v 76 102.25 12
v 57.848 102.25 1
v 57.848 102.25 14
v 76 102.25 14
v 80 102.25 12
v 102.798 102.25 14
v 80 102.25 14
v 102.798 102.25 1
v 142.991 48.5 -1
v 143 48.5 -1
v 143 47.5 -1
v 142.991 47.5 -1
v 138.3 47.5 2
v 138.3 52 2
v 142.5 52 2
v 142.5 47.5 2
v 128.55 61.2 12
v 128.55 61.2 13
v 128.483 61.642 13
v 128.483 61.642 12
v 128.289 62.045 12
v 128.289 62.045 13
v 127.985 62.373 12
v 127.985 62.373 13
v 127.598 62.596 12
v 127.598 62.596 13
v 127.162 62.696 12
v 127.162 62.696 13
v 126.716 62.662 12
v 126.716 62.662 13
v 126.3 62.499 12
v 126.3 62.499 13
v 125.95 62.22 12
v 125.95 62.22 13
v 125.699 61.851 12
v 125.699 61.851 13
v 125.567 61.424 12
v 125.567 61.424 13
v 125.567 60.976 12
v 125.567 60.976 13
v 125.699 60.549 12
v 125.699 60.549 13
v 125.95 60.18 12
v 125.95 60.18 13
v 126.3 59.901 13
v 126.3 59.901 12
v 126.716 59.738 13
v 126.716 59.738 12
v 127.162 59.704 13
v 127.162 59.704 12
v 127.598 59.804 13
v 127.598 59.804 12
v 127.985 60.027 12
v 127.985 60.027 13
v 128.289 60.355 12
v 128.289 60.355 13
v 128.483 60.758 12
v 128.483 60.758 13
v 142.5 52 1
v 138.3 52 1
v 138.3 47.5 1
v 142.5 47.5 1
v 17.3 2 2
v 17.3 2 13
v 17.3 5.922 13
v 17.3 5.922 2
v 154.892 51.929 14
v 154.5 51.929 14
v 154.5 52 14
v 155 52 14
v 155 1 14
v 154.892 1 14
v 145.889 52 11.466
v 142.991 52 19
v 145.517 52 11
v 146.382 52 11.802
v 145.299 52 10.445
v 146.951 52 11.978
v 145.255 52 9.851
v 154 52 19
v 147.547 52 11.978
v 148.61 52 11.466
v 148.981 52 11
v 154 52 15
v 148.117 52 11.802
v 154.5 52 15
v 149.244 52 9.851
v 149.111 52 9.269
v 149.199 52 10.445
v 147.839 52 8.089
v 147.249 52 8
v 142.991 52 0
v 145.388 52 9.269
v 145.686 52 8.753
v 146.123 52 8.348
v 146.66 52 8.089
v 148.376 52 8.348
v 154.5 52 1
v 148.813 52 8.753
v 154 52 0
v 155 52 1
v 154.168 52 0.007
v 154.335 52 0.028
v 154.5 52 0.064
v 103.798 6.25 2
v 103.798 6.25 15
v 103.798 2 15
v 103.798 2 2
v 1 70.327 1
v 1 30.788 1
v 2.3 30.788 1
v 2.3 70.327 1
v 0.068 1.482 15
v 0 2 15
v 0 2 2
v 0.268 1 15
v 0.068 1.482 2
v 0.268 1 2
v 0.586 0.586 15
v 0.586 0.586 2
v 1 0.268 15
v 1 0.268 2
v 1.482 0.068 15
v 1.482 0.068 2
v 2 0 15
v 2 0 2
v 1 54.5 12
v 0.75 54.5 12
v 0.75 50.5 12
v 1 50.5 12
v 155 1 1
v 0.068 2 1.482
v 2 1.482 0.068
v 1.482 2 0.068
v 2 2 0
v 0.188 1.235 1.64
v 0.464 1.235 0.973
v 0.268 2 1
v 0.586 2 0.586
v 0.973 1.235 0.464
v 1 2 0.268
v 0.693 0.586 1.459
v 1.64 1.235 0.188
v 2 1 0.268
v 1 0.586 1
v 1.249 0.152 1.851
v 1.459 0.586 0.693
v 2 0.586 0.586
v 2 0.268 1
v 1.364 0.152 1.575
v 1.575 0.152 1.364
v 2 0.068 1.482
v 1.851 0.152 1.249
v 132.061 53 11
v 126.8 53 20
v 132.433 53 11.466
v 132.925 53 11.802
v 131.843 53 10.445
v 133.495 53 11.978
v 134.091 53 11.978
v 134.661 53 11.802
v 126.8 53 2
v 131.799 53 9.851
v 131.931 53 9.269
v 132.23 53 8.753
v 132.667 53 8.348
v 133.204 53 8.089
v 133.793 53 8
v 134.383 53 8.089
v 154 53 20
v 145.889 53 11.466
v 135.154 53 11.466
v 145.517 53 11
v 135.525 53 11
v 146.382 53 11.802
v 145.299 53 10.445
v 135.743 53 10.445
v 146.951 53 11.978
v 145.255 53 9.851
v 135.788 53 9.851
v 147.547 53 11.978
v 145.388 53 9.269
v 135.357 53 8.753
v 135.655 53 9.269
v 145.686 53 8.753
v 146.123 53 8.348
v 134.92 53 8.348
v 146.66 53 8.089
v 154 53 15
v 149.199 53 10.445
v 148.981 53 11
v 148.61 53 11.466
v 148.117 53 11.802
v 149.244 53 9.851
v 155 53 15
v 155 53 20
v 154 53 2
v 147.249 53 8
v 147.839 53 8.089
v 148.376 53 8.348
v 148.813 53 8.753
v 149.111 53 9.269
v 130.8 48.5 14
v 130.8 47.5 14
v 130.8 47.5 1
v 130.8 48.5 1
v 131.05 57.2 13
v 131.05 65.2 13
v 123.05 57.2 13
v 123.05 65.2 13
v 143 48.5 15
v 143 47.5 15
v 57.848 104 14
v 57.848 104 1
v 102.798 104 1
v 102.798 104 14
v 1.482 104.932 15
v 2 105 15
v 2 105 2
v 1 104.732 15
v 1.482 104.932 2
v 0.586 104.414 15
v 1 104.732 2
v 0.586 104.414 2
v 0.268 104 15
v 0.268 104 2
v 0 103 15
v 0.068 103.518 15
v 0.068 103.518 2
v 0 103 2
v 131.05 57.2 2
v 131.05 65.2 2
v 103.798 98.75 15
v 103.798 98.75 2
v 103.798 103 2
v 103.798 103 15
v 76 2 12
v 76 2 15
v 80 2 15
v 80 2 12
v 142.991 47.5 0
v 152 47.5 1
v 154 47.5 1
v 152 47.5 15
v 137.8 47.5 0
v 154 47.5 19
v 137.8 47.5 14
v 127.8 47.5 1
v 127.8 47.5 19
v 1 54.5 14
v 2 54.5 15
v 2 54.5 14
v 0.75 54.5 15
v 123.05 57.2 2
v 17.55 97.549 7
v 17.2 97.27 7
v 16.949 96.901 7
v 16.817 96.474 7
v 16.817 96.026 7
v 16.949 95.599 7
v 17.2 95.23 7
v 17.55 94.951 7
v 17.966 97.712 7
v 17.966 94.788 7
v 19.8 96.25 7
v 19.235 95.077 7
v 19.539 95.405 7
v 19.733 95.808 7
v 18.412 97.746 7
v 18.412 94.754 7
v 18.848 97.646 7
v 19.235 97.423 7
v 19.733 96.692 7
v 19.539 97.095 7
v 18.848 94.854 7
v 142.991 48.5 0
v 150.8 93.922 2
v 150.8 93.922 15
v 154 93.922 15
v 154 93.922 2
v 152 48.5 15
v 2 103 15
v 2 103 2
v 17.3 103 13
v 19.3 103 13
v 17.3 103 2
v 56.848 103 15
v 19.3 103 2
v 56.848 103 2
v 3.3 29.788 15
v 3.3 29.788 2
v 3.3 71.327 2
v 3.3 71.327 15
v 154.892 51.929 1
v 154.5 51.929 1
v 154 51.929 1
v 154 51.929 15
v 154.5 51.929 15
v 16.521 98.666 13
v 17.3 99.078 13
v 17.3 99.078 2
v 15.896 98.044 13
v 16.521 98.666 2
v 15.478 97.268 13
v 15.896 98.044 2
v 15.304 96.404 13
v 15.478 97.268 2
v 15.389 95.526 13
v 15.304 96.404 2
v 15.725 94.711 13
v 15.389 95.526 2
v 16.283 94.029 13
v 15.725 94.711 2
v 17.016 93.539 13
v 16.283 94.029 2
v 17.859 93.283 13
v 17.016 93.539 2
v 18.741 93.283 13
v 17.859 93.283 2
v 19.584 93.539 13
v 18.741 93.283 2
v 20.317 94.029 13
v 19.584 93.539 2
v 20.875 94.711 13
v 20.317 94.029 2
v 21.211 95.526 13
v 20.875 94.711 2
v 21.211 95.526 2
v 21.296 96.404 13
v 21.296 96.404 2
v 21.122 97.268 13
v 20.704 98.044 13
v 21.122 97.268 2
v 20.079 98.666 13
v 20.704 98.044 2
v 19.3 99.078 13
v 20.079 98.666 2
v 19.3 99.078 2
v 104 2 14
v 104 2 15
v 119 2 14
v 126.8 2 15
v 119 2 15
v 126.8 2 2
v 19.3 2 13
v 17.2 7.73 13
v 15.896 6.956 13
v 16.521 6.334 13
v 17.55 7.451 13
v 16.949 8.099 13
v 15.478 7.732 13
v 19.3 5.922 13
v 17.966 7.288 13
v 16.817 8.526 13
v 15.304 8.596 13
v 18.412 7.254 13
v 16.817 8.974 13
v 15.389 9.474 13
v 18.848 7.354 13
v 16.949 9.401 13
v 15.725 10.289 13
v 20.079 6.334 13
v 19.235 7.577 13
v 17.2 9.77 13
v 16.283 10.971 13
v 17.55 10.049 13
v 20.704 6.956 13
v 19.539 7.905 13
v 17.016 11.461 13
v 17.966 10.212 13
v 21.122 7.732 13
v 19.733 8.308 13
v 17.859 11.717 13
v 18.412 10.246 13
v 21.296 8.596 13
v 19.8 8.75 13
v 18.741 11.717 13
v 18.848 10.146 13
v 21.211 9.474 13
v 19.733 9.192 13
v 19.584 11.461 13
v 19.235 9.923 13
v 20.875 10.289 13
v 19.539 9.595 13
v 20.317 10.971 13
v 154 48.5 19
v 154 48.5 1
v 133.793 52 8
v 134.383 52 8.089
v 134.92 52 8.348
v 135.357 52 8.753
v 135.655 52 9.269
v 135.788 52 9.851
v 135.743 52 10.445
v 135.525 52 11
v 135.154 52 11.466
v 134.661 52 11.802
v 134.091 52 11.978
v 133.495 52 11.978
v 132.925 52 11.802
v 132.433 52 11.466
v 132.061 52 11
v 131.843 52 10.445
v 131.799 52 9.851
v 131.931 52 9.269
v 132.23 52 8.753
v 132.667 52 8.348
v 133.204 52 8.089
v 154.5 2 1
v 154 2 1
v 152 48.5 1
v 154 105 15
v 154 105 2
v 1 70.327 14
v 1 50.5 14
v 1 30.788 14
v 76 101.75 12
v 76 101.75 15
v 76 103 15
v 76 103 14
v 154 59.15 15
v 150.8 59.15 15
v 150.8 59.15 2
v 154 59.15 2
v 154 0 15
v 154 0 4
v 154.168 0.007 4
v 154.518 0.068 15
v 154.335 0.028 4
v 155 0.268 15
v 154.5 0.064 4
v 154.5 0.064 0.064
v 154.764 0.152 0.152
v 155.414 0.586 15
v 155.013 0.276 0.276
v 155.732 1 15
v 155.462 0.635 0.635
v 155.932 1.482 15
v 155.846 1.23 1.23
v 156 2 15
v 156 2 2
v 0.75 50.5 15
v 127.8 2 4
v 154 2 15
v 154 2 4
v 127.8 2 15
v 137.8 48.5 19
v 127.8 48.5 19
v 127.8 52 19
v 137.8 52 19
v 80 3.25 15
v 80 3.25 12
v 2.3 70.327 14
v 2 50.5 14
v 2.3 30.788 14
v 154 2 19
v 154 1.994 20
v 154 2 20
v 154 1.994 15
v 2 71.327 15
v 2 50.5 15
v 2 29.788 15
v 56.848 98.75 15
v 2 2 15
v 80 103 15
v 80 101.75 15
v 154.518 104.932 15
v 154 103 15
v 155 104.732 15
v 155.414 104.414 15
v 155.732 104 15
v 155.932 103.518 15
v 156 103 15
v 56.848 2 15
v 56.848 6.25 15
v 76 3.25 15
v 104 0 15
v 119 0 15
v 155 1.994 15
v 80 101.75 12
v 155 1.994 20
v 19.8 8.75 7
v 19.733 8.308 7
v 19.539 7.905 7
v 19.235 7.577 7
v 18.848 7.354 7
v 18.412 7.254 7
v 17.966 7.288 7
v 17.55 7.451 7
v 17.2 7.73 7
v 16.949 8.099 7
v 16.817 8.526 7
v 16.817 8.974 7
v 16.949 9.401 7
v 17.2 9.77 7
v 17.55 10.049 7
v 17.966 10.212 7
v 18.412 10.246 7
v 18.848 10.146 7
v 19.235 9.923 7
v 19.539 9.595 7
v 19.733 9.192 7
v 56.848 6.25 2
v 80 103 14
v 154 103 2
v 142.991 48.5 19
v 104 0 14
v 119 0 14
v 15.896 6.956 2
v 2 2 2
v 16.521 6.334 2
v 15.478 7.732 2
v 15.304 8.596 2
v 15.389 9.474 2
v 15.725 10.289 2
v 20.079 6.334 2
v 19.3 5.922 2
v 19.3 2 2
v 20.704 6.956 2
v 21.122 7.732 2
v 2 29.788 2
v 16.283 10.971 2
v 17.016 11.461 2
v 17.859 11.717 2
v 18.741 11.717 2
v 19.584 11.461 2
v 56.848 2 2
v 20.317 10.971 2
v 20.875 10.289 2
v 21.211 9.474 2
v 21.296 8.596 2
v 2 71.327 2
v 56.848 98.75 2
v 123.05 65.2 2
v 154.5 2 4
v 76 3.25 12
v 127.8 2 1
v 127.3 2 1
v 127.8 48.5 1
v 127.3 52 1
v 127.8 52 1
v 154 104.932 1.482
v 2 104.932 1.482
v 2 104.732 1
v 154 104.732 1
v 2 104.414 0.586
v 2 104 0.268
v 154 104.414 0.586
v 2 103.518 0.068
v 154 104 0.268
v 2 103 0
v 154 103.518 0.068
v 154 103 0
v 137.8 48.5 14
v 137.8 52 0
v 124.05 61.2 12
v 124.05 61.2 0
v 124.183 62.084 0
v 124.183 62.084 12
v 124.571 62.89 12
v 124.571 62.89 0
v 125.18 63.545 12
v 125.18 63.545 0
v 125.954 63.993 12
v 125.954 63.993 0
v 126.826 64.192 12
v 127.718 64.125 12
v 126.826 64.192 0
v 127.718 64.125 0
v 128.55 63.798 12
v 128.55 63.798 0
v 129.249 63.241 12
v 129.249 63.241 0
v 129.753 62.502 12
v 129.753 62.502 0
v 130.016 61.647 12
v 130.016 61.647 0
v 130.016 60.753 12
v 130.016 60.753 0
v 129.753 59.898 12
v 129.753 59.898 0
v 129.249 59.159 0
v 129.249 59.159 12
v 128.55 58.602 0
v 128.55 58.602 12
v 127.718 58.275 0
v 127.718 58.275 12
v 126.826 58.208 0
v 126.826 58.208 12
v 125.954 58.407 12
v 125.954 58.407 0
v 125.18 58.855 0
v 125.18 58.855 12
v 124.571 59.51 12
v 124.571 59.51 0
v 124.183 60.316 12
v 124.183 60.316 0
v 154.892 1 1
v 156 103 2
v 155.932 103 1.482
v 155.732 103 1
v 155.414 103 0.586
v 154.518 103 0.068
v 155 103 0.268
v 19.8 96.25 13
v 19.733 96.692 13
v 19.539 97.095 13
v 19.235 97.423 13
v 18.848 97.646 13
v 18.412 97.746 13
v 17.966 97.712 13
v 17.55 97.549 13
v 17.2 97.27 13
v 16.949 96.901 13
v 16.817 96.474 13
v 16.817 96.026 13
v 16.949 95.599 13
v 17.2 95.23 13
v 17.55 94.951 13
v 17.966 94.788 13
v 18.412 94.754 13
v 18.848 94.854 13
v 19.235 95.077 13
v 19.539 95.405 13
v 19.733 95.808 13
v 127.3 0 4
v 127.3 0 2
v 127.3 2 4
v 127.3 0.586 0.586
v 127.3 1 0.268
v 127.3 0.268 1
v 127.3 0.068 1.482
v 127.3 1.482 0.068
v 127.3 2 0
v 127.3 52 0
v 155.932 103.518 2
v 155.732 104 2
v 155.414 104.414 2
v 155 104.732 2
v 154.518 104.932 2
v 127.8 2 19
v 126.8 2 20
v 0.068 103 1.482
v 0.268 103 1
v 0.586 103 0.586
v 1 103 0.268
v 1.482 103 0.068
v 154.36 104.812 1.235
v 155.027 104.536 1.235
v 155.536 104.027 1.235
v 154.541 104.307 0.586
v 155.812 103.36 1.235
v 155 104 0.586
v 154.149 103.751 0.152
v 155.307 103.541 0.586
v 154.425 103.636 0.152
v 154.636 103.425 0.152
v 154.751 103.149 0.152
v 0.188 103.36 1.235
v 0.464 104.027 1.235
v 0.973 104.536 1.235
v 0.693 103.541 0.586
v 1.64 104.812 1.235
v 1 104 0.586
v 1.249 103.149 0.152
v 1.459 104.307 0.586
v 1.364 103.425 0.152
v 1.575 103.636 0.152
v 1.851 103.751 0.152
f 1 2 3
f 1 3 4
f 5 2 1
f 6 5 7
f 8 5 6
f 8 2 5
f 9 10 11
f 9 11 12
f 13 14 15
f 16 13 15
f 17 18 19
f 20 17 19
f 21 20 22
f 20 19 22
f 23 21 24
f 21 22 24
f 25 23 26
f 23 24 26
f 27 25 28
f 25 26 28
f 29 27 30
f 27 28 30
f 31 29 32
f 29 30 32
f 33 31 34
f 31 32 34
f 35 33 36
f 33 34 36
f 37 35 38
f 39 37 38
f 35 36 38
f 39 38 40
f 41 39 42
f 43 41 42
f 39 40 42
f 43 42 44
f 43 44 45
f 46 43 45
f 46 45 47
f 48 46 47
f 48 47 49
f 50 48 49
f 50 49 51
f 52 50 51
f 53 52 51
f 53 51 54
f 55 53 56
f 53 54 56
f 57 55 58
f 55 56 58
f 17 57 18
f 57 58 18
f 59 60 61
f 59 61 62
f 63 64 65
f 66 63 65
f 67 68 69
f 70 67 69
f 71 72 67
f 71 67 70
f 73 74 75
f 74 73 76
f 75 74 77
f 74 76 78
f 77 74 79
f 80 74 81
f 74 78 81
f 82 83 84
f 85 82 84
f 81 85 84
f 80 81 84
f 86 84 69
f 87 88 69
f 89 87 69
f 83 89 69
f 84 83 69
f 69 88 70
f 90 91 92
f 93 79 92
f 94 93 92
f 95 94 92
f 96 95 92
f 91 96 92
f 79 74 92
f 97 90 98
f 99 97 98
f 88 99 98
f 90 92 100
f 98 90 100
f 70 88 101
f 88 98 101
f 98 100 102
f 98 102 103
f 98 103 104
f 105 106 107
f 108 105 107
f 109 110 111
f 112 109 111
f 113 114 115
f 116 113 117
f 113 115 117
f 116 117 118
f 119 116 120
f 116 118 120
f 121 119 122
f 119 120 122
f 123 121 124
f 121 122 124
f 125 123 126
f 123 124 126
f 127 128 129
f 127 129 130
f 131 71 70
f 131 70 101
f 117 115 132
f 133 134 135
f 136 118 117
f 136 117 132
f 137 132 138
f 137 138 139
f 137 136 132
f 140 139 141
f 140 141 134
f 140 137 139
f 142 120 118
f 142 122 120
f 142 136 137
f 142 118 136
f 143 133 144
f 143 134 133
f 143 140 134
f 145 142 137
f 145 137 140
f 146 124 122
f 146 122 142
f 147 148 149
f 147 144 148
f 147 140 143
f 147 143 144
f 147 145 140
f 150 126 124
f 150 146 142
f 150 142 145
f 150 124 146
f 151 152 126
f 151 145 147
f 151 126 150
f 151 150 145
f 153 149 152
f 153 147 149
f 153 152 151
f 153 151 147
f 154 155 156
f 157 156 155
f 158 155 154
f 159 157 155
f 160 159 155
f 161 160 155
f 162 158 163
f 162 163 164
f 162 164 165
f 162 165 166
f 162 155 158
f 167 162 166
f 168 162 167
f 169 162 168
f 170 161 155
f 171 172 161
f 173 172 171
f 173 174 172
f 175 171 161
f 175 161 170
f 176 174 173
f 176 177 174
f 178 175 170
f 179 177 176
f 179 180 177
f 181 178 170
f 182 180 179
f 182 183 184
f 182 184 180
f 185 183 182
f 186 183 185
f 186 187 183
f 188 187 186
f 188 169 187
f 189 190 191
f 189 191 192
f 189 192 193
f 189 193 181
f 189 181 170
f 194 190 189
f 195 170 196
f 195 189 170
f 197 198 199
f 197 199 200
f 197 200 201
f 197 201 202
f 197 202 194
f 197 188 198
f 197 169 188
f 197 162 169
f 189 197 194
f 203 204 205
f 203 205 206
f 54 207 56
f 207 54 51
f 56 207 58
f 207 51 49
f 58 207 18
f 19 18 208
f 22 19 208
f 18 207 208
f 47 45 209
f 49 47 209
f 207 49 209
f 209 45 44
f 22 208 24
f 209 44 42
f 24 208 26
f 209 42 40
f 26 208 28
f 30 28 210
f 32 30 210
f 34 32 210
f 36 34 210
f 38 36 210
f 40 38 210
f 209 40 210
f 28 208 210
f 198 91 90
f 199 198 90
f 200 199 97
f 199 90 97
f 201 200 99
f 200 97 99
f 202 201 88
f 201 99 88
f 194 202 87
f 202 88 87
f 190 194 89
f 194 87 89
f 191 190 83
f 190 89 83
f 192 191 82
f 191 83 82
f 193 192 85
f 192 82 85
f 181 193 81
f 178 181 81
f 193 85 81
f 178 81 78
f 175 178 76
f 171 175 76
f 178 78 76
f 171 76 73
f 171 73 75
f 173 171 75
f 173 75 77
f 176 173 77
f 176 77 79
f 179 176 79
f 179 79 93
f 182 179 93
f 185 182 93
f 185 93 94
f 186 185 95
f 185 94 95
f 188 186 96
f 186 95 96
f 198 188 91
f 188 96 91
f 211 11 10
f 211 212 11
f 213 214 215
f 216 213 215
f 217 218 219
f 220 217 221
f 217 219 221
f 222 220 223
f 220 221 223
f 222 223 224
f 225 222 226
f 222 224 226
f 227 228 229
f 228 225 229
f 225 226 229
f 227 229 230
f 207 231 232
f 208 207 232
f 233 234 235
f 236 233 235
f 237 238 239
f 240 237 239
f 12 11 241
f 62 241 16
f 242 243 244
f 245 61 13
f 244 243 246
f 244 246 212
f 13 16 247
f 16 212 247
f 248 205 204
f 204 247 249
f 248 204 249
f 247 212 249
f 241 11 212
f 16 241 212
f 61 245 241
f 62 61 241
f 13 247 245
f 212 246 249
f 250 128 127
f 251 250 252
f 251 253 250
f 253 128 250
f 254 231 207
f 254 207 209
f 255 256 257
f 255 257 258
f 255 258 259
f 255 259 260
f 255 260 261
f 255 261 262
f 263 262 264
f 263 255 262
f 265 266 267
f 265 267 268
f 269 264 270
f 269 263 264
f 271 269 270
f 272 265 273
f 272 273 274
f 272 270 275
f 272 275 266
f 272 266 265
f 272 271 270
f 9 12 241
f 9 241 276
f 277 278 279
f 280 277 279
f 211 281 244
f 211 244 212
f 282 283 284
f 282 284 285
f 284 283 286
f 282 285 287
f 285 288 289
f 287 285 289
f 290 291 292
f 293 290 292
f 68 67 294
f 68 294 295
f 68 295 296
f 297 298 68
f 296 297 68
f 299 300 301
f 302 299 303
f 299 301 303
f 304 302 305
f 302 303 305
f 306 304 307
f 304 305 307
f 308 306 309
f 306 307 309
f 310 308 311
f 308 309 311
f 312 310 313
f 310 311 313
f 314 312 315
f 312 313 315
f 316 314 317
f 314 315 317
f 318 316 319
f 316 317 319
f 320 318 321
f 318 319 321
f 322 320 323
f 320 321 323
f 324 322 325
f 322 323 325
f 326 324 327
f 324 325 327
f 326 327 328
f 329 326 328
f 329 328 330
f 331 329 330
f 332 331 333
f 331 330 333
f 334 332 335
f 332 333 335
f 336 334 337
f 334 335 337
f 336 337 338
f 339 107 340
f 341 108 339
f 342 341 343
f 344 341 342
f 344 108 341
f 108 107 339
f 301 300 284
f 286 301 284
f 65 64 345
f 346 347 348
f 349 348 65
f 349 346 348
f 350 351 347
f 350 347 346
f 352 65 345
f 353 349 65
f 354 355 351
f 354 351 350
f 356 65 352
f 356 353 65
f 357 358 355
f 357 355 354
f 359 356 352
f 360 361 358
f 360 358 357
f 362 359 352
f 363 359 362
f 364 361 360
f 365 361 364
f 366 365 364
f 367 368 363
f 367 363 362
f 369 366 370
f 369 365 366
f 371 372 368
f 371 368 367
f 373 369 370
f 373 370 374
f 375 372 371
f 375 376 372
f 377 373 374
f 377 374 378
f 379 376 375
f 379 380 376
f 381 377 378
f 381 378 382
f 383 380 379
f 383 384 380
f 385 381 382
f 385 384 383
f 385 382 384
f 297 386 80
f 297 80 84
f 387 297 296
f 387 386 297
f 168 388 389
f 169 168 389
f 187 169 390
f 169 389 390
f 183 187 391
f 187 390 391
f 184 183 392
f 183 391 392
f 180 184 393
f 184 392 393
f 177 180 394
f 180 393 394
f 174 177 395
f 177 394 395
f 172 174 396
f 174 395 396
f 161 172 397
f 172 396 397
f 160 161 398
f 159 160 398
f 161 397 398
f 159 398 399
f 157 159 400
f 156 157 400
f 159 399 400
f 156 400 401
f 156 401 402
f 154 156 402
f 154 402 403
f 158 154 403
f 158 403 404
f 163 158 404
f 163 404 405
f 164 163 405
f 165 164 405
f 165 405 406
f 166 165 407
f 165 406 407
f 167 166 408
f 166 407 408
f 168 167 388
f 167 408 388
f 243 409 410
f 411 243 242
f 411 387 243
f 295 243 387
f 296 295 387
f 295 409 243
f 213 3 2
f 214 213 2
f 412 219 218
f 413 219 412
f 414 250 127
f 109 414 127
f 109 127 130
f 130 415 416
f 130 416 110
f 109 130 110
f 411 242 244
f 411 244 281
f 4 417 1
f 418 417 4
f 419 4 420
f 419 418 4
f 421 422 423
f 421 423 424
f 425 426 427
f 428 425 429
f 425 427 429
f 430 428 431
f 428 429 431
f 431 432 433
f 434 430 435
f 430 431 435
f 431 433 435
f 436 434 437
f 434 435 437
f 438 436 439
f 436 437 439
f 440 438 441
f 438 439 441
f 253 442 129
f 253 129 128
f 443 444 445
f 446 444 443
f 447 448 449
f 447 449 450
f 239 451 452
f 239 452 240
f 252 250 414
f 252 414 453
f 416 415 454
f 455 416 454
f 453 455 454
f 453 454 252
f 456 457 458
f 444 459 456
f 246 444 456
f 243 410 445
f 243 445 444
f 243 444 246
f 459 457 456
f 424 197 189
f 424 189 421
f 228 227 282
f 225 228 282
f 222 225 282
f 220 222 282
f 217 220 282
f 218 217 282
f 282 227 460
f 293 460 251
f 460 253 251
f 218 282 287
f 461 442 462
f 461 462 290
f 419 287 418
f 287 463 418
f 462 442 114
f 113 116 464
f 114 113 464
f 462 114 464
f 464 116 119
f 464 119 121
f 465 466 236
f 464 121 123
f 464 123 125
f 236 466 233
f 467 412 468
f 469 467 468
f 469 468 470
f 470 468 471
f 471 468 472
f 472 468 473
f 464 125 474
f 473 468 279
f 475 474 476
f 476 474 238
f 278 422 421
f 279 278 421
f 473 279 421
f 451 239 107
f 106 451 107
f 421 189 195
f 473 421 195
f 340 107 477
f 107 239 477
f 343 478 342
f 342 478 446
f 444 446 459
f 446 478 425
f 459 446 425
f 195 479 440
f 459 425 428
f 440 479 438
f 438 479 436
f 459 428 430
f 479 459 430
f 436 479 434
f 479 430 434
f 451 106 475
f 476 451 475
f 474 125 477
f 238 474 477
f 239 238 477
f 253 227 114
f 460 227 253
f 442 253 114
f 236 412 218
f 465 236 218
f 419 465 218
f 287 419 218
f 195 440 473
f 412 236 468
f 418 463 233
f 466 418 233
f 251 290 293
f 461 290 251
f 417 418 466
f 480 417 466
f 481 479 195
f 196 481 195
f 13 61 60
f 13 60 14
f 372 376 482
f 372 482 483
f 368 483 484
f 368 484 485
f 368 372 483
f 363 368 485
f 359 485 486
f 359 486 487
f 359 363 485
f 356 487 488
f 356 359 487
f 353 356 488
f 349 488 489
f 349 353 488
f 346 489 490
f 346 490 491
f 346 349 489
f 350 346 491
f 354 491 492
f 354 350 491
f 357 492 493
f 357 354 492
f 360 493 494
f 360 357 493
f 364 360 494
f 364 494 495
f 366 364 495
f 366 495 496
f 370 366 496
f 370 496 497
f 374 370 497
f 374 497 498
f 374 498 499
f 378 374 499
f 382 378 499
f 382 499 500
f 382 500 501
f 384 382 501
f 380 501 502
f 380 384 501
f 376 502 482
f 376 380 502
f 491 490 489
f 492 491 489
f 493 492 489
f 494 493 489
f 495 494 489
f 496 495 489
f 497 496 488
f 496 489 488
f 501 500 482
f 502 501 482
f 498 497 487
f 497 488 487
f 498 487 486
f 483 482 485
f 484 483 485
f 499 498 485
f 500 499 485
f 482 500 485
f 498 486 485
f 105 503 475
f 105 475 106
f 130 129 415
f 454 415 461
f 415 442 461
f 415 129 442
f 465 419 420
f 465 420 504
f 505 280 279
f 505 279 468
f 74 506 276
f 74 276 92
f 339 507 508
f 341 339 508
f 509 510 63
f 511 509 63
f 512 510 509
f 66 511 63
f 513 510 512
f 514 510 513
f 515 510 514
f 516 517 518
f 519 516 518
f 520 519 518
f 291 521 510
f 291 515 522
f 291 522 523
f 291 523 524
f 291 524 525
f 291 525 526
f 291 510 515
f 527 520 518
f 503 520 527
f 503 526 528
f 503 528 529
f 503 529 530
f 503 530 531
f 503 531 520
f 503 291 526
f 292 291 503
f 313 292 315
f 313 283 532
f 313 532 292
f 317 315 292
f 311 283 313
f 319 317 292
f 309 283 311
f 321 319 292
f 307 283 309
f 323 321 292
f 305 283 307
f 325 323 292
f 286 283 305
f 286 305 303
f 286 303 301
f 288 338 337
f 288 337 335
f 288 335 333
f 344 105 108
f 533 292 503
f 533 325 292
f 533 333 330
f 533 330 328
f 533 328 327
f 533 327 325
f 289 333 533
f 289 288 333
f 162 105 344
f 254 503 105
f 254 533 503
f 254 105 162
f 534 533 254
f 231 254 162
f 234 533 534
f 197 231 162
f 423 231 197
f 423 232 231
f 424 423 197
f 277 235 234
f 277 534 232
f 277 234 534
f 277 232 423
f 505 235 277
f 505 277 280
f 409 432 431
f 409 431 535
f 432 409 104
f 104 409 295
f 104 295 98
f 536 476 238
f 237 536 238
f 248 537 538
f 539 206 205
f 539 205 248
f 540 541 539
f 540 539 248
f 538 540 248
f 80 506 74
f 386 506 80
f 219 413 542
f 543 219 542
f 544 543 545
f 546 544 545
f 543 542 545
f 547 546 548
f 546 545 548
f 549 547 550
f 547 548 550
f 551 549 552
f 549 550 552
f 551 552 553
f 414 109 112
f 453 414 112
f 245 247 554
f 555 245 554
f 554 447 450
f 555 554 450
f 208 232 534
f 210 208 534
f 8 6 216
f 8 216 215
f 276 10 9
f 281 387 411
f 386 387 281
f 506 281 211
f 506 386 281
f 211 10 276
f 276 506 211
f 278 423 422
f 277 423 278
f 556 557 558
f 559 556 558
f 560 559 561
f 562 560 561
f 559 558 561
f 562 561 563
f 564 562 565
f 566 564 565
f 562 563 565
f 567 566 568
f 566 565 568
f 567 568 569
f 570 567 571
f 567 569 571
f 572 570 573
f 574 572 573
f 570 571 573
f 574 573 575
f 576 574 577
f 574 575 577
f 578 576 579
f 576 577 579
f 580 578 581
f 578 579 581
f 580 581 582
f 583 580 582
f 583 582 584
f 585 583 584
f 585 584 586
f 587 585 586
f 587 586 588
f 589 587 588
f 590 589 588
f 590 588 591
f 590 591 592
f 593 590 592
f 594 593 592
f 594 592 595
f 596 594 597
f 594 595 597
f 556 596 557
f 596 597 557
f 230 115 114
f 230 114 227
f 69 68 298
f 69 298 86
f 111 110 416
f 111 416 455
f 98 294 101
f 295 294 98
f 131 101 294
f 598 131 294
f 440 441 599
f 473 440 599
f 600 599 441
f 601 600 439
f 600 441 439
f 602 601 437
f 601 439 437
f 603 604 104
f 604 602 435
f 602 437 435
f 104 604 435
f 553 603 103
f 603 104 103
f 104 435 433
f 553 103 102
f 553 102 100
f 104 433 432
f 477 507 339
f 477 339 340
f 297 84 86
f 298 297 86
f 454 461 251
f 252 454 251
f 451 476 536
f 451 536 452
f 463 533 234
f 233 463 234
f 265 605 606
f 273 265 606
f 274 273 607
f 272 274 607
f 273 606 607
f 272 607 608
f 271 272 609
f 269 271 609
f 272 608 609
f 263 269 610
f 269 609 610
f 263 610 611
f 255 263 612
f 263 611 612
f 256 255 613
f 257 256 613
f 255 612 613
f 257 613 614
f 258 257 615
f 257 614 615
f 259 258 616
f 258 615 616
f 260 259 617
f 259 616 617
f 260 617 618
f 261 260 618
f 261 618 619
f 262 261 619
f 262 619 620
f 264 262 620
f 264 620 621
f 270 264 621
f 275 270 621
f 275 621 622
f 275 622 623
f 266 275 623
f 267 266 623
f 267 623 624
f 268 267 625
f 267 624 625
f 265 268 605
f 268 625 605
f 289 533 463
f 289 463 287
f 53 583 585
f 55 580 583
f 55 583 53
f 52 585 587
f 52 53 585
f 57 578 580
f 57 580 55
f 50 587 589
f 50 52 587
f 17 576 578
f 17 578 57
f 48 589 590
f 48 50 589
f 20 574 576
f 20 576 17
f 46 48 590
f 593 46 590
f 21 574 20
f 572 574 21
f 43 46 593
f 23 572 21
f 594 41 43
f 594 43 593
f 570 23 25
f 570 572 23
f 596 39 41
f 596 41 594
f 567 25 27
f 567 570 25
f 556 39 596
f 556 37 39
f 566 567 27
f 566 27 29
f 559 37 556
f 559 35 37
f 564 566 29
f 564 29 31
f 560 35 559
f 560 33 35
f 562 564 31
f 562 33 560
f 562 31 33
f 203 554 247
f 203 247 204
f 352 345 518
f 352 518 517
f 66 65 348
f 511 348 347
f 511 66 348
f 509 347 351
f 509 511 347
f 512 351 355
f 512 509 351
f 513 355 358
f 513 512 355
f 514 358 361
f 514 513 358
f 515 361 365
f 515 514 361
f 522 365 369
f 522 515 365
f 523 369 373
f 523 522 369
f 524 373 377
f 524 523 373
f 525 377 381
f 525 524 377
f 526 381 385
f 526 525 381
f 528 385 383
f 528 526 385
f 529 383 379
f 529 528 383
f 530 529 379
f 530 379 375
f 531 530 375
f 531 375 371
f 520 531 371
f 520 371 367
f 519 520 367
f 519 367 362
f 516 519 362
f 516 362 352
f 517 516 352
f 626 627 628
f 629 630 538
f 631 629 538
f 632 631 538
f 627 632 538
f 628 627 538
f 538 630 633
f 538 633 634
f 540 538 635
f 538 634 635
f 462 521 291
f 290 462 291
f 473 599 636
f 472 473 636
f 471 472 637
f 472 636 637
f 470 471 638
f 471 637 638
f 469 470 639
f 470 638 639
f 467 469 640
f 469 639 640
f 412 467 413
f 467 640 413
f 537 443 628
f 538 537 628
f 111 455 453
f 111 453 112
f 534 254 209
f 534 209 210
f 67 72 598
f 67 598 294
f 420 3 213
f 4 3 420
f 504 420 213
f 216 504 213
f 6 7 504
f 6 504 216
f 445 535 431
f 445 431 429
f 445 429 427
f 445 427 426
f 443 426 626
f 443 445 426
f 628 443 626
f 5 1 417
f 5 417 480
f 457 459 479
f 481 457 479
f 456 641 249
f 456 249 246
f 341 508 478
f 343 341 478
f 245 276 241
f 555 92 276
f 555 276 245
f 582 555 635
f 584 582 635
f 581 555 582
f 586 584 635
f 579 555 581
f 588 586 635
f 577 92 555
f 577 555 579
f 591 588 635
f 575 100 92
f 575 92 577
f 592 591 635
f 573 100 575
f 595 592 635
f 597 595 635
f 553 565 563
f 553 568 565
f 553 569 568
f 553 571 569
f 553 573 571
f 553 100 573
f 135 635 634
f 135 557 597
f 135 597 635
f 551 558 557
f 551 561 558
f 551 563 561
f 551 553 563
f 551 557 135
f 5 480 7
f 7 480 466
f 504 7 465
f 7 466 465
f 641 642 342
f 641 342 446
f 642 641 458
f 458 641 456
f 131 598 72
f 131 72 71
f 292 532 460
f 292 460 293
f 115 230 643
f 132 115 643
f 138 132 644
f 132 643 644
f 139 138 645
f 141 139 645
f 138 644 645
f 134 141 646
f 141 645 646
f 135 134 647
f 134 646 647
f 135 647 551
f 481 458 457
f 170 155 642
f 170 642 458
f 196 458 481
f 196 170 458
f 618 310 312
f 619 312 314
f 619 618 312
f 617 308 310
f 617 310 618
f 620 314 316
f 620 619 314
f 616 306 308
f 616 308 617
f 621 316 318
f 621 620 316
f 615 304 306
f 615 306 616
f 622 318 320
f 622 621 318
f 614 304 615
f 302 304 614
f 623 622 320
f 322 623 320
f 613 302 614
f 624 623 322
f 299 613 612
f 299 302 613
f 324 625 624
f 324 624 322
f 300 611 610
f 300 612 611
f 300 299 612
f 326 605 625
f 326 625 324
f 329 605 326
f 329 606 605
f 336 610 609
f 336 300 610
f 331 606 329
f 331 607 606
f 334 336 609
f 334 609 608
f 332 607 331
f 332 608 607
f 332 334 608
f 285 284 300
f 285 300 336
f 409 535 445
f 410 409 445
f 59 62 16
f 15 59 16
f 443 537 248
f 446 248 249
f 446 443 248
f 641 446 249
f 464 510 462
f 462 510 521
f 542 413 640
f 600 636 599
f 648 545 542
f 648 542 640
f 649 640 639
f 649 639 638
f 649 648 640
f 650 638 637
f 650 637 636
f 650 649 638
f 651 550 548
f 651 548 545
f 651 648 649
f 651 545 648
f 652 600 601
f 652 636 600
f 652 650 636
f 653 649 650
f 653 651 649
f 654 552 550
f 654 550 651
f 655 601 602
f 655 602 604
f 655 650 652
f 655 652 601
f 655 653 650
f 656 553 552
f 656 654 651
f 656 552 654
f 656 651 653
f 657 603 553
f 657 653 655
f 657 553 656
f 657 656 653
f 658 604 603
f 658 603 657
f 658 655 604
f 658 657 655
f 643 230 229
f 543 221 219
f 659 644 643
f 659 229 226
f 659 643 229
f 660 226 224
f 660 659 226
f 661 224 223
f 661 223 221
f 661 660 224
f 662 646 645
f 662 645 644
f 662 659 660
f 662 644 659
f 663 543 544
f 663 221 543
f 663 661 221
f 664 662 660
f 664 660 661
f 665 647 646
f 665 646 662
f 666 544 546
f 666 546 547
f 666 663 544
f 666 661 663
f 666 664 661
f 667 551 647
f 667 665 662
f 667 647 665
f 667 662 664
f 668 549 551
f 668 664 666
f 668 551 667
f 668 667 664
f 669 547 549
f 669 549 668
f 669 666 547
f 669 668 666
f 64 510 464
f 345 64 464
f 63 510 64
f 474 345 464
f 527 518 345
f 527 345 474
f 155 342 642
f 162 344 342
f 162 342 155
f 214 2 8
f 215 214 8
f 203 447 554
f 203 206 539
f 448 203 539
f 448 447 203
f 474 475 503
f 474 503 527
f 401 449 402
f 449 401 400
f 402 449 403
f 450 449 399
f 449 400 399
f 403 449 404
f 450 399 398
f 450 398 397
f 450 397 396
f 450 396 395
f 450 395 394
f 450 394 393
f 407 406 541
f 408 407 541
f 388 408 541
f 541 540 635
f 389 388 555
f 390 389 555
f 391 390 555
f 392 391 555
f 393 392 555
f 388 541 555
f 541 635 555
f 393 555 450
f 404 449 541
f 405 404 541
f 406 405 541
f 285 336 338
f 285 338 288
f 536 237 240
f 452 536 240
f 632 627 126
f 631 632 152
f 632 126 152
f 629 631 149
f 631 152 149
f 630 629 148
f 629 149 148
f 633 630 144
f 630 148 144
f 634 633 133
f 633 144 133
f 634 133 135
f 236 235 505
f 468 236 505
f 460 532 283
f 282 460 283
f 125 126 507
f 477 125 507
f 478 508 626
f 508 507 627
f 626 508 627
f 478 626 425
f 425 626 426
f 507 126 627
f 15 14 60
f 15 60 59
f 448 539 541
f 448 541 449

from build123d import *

# Parameters (mm, degrees)
SKETCH2_W                = 156
SKETCH2_H                = 105
BOSS_EXTRUDE1_DEPTH      = 15
SHELL1_T                 = -2
SKETCH16_W               = 1.3
SKETCH16_H               = 41.538446475
BOSS_EXTRUDE7_DEPTH      = 13
SKETCH17_W               = 46.949973518
SKETCH17_H               = 1.75
BOSS_EXTRUDE8_DEPTH      = 13
SKETCH18_W               = 27.2
SKETCH18_H               = 51
BOSS_EXTRUDE9_DEPTH      = 18
SHELL2_START             = 2
SHELL2_DEPTH             = 50
SHELL2_START_2           = 102.25
SHELL2_2_OUTLINE_W       = 44.949973518
SHELL2_2_OUTLINE_H       = 13
SHELL2_2_DEPTH           = 1.75
SHELL2_START_3           = 30.788376177
SHELL2_3_OUTLINE_W       = 1.3
SHELL2_3_OUTLINE_H       = 13
SHELL2_3_DEPTH           = 39.538446475
SHELL2_START_4           = 1
SHELL2_4_OUTLINE_W       = 27.2
SHELL2_4_OUTLINE_H       = 13
SHELL2_4_DEPTH           = 1
SKETCH19_W               = 26.2
SKETCH19_H               = 52
CUT_EXTRUDE9_DEPTH       = 2
BOSS_EXTRUDE10_REACH     = 190.566
SKETCH24_W               = 0.891520296
SKETCH24_H               = 50.929477882
SKETCH25_W               = 26.2
SKETCH25_H               = 1
BOSS_EXTRUDE11_DEPTH     = 12
SKETCH27_W               = 26.2
SKETCH27_H               = 1
BOSS_EXTRUDE12_DEPTH     = 18
SKETCH28_W               = 9
SKETCH28_H               = 1
CUT_EXTRUDE10_DEPTH      = 14
SKETCH29_W               = 7
SKETCH29_H               = 1
CUT_EXTRUDE11_DEPTH      = 13
SKETCH30_W               = 0.5
SKETCH30_H               = 52
CUT_EXTRUDE12_DEPTH      = 1
SKETCH31_W               = 0.5
SKETCH31_H               = 52
CUT_EXTRUDE13_DEPTH      = 1
SKETCH32_W               = 5.2
SKETCH32_H               = 1
BOSS_EXTRUDE13_DEPTH     = 1
SKETCH34_W               = 5.2
SKETCH34_H               = 1
BOSS_EXTRUDE14_DEPTH     = 1
SKETCH35_W               = 5.190628433
SKETCH35_H               = 3.5
BOSS_EXTRUDE15_DEPTH     = 20
SKETCH38_W               = 0.5
SKETCH38_H               = 0.070522118
CUT_EXTRUDE14_DEPTH      = 1
SKETCH41_R               = 2
CUT_EXTRUDE15_DEPTH      = 1
SKETCH42_R               = 2
CUT_EXTRUDE16_DEPTH      = 1
SKETCH43_W               = 5.190628433
SKETCH43_H               = 4.5
CUT_EXTRUDE17_DEPTH      = 1
SKETCH44_W               = 1
SKETCH44_H               = 51.006111213
BOSS_EXTRUDE16_DEPTH     = 5
SKETCH46_W               = 4.2
SKETCH46_H               = 1
CUT_EXTRUDE18_DEPTH      = 4.5
CUT_EXTRUDE19_DEPTH      = 2
CUT_EXTRUDE19_DEPTH_BACK = 2
SKETCH47_W               = 27.2
SKETCH47_H               = 2
SKETCH50_W               = 3.2
SKETCH50_H               = 34.771823391
BOSS_EXTRUDE17_DEPTH     = 13
SKETCH51_R               = 3
BOSS_EXTRUDE18_DEPTH     = 13
SKETCH54_R               = 1.5
CUT_EXTRUDE20_DEPTH      = 6
SKETCH56_W               = 4
SKETCH56_H               = 1.25
CUT_EXTRUDE21_DEPTH      = 3
SKETCH57_W               = 1.25
SKETCH57_H               = 4
CUT_EXTRUDE22_DEPTH      = 3
SKETCH60_W               = 15
SKETCH60_H               = 1
CUT_EXTRUDE24_DEPTH      = 2
SKETCH62_W               = 8
SKETCH62_H               = 8
BOSS_EXTRUDE19_DEPTH     = 13
SKETCH64_R               = 3
CUT_EXTRUDE25_DEPTH      = 12
SKETCH63_R               = 1.5
CUT_EXTRUDE26_DEPTH      = 1
FILLET1_R                = 2
SKETCH66_W               = 46.949973518
SKETCH66_H               = 2.5
BOSS_EXTRUDE20_DEPTH     = 13
RIB1_REACH               = 190.566
SKETCH69_WALLS_W         = 2
SKETCH69_WALLS_H         = 382.881276878
RIB2_REACH               = 190.566
SKETCH70_WALLS_W         = 2
SKETCH70_WALLS_H         = 382.881276878


# Read off the part's stored shape, not the designer's step: Shell2
with BuildPart() as part:
    # Sketch2 → Boss-Extrude1 (new body)
    with BuildSketch(Plane.XY):
        with Locations((78, 52.5)):
            Rectangle(SKETCH2_W, SKETCH2_H)
    extrude(amount=BOSS_EXTRUDE1_DEPTH)

    # Shell1
    shell1_openings = [part.faces().sort_by_distance(p)[0] for p in [
        (78, 52.5, 15),
    ]]
    offset(amount=SHELL1_T, openings=shell1_openings, kind=Kind.INTERSECTION)

    # Sketch16 → Boss-Extrude7 (add)
    with BuildSketch(Plane.XY.offset(2)):
        with Locations((2.65, 50.557599415)):
            Rectangle(SKETCH16_W, SKETCH16_H)
    extrude(amount=BOSS_EXTRUDE7_DEPTH)

    # Sketch17 → Boss-Extrude8 (add)
    with BuildSketch(Plane.XY.offset(2)):
        with Locations((80.323462853, 102.125)):
            Rectangle(SKETCH17_W, SKETCH17_H)
    boss_extrude8 = extrude(amount=BOSS_EXTRUDE8_DEPTH)

    # Sketch18 → Boss-Extrude9 (add)
    with BuildSketch(Plane.XY.offset(2)):
        with Locations((140.4, 27.5)):
            Rectangle(SKETCH18_W, SKETCH18_H)
    extrude(amount=BOSS_EXTRUDE9_DEPTH)

    # Shell2 outline → Shell2 (cut)
    with BuildSketch(Plane(origin=(0, 0, 0), x_dir=(1, 0, 0), z_dir=(0, 1, 0)).offset(SHELL2_START)):
        Polygon((127.8, -1), (127.8, -19), (154, -19), (154, -14), (155, -14), (155, -1), align=None)
    extrude(amount=SHELL2_DEPTH, mode=Mode.SUBTRACT)

    # Shell2 2 outline → Shell2 2 (cut)
    with BuildSketch(Plane(origin=(0, 0, 0), x_dir=(1, 0, 0), z_dir=(0, 1, 0)).offset(SHELL2_START_2)):
        with Locations((80.323462853, -7.5)):
            Rectangle(SHELL2_2_OUTLINE_W, SHELL2_2_OUTLINE_H)
    extrude(amount=SHELL2_2_DEPTH, mode=Mode.SUBTRACT)

    # Shell2 3 outline → Shell2 3 (cut)
    with BuildSketch(Plane(origin=(0, 0, 0), x_dir=(1, 0, 0), z_dir=(0, 1, 0)).offset(SHELL2_START_3)):
        with Locations((1.65, -7.5)):
            Rectangle(SHELL2_3_OUTLINE_W, SHELL2_3_OUTLINE_H)
    extrude(amount=SHELL2_3_DEPTH, mode=Mode.SUBTRACT)

    # Shell2 4 outline → Shell2 4 (cut)
    with BuildSketch(Plane(origin=(0, 0, 0), x_dir=(1, 0, 0), z_dir=(0, 1, 0)).offset(SHELL2_START_4)):
        with Locations((141.4, -7.5)):
            Rectangle(SHELL2_4_OUTLINE_W, SHELL2_4_OUTLINE_H)
    extrude(amount=SHELL2_4_DEPTH, mode=Mode.SUBTRACT)

    # Sketch19 → Cut-Extrude9 (cut)
    with BuildSketch(Plane(origin=(0, 0, 0), x_dir=(-1, 0, 0), z_dir=(0, 0, -1))):
        with Locations((-140.9, 26)):
            Rectangle(SKETCH19_W, SKETCH19_H)
    extrude(amount=-CUT_EXTRUDE9_DEPTH, mode=Mode.SUBTRACT)

    # Sketch24 → Boss-Extrude10 (add, up to next)
    with BuildSketch(Plane(origin=(0, 0, 14), x_dir=(-1, 0, 0), z_dir=(0, 0, -1)), mode=Mode.PRIVATE) as boss_extrude10_sk1:
        with Locations((-154.445760148, 26.464738941)):
            Rectangle(SKETCH24_W, SKETCH24_H)
    boss_extrude10_tool1 = extrude(boss_extrude10_sk1.sketch, amount=BOSS_EXTRUDE10_REACH, mode=Mode.PRIVATE) - part.part
    add(boss_extrude10_tool1.solids().sort_by_distance((154.44576, 26.464739, 14))[0])

    # Sketch25 → Boss-Extrude11 (add)
    with BuildSketch(Plane(origin=(0, 0, 14), x_dir=(-1, 0, 0), z_dir=(0, 0, -1))):
        with Locations((-140.9, 1.5)):
            Rectangle(SKETCH25_W, SKETCH25_H)
    extrude(amount=BOSS_EXTRUDE11_DEPTH)

    # Sketch27 → Boss-Extrude12 (add)
    with BuildSketch(Plane(origin=(0, 0, 19), x_dir=(-1, 0, 0), z_dir=(0, 0, -1))):
        with Locations((-140.9, 48)):
            Rectangle(SKETCH27_W, SKETCH27_H)
    extrude(amount=BOSS_EXTRUDE12_DEPTH)

    # Sketch28 → Cut-Extrude10 (cut)
    with BuildSketch(Plane(origin=(0, 0, 1), x_dir=(-1, 0, 0), z_dir=(0, 0, -1))):
        with Locations((-147.5, 48)):
            Rectangle(SKETCH28_W, SKETCH28_H)
    extrude(amount=-CUT_EXTRUDE10_DEPTH, mode=Mode.SUBTRACT)

    # Sketch29 → Cut-Extrude11 (cut)
    with BuildSketch(Plane(origin=(0, 0, 1), x_dir=(-1, 0, 0), z_dir=(0, 0, -1))):
        with Locations((-134.3, 48)):
            Rectangle(SKETCH29_W, SKETCH29_H)
    extrude(amount=-CUT_EXTRUDE11_DEPTH, mode=Mode.SUBTRACT)

    # Sketch30 → Cut-Extrude12 (cut)
    with BuildSketch(Plane(origin=(0, 0, 0), x_dir=(-1, 0, 0), z_dir=(0, 0, -1))):
        with Locations((-127.55, 26)):
            Rectangle(SKETCH30_W, SKETCH30_H)
    extrude(amount=-CUT_EXTRUDE12_DEPTH, mode=Mode.SUBTRACT)

    # Sketch31 → Cut-Extrude13 (cut)
    with BuildSketch(Plane(origin=(0, 0, 0), x_dir=(-1, 0, 0), z_dir=(0, 0, -1))):
        with Locations((-154.25, 26)):
            Rectangle(SKETCH31_W, SKETCH31_H)
    extrude(amount=-CUT_EXTRUDE13_DEPTH, mode=Mode.SUBTRACT)

    # Sketch32 → Boss-Extrude13 (add)
    with BuildSketch(Plane(origin=(0, 0, 1), x_dir=(-1, 0, 0), z_dir=(0, 0, -1))):
        with Locations((-140.4, 48)):
            Rectangle(SKETCH32_W, SKETCH32_H)
    extrude(amount=BOSS_EXTRUDE13_DEPTH)

    # Sketch34 → Boss-Extrude14 (add)
    with BuildSketch(Plane(origin=(0, 0, 0), x_dir=(-1, 0, 0), z_dir=(0, 0, -1))):
        with Locations((-140.4, 48)):
            Rectangle(SKETCH34_W, SKETCH34_H)
    extrude(amount=BOSS_EXTRUDE14_DEPTH)

    # Sketch35 → Boss-Extrude15 (add)
    with BuildSketch(Plane(origin=(0, 0, 19), x_dir=(-1, 0, 0), z_dir=(0, 0, -1))):
        with Locations((-140.395314217, 50.25)):
            Rectangle(SKETCH35_W, SKETCH35_H)
    extrude(amount=BOSS_EXTRUDE15_DEPTH)

    # Sketch38 → Cut-Extrude14 (cut)
    with BuildSketch(Plane(origin=(0, 0, 14), x_dir=(-1, 0, 0), z_dir=(0, 0, -1))):
        with Locations((-154.25, 51.964738941)):
            Rectangle(SKETCH38_W, SKETCH38_H)
    extrude(amount=-CUT_EXTRUDE14_DEPTH, mode=Mode.SUBTRACT)

    # Sketch41 → Cut-Extrude15 (cut)
    with BuildSketch(Plane.XZ.offset(-52)):
        with Locations(Location((147.249273033, 10, 0), (0, 0, 270))):
            Circle(SKETCH41_R)
    extrude(amount=-CUT_EXTRUDE15_DEPTH, mode=Mode.SUBTRACT)

    # Sketch42 → Cut-Extrude16 (cut)
    with BuildSketch(Plane.XZ.offset(-52)):
        with Locations(Location((133.793210636, 10, 0), (0, 0, 270))):
            Circle(SKETCH42_R)
    extrude(amount=-CUT_EXTRUDE16_DEPTH, mode=Mode.SUBTRACT)

    # Sketch43 → Cut-Extrude17 (cut)
    with BuildSketch(Plane(origin=(0, 0, -1), x_dir=(-1, 0, 0), z_dir=(0, 0, -1))):
        with Locations((-140.395314217, 49.75)):
            Rectangle(SKETCH43_W, SKETCH43_H)
    extrude(amount=-CUT_EXTRUDE17_DEPTH, mode=Mode.SUBTRACT)

    # Sketch44 → Boss-Extrude16 (add)
    with BuildSketch(Plane.XY.offset(15)):
        with Locations((154.5, 27.496944394)):
            Rectangle(SKETCH44_W, SKETCH44_H)
    extrude(amount=BOSS_EXTRUDE16_DEPTH)

    # Sketch46 → Cut-Extrude18 (cut)
    with BuildSketch(Plane.XZ.offset(-47.5)):
        with Locations((140.4, 1.5)):
            Rectangle(SKETCH46_W, SKETCH46_H)
    extrude(amount=-CUT_EXTRUDE18_DEPTH, mode=Mode.SUBTRACT)

    # Sketch47 → Cut-Extrude19 (cut, two sides: drawn at the far end of the back side and taken through both)
    with BuildSketch(Plane(origin=(0, 0, 2), x_dir=(-1, 0, 0), z_dir=(0, 0, -1)).offset(-CUT_EXTRUDE19_DEPTH_BACK)):
        with Locations((-140.9, 1)):
            Rectangle(SKETCH47_W, SKETCH47_H)
    extrude(amount=CUT_EXTRUDE19_DEPTH + CUT_EXTRUDE19_DEPTH_BACK, mode=Mode.SUBTRACT)

    # Mirror3: Boss-Extrude8 across plane
    add(boss_extrude8.mirror(Plane(origin=(0, 52.5, 0), x_dir=(0, 0, 1), z_dir=(0, -1, 0))))

    # Sketch50 → Boss-Extrude17 (add)
    with BuildSketch(Plane.XY.offset(2)):
        with Locations((152.4, 76.53582262)):
            Rectangle(SKETCH50_W, SKETCH50_H)
    extrude(amount=BOSS_EXTRUDE17_DEPTH)

    # Sketch51 → Boss-Extrude18 (add)
    with BuildSketch(Plane.XY):
        with Locations(Location((18.3, 96.25, 0), (0, 0, 180))):
            Circle(SKETCH51_R)
    boss_extrude18 = extrude(amount=BOSS_EXTRUDE18_DEPTH)

    # Sketch54 → Cut-Extrude20 (cut)
    with BuildSketch(Plane.XY.offset(13)):
        with Locations((18.3, 96.25)):
            Circle(SKETCH54_R)
    cut_extrude20 = extrude(amount=-CUT_EXTRUDE20_DEPTH, mode=Mode.SUBTRACT)

    # Mirror4: Boss-Extrude18, Cut-Extrude20 across plane
    add(boss_extrude18.mirror(Plane(origin=(0, 52.5, 0), x_dir=(0, 0, 1), z_dir=(0, -1, 0))))
    add(cut_extrude20.mirror(Plane(origin=(0, 52.5, 0), x_dir=(0, 0, 1), z_dir=(0, -1, 0))), mode=Mode.SUBTRACT)

    # Sketch56 → Cut-Extrude21 (cut)
    with BuildSketch(Plane.XY.offset(15)):
        with Locations((78, 102.375)):
            Rectangle(SKETCH56_W, SKETCH56_H)
    cut_extrude21 = extrude(amount=-CUT_EXTRUDE21_DEPTH, mode=Mode.SUBTRACT)

    # Mirror5: Cut-Extrude21 across plane
    add(cut_extrude21.mirror(Plane(origin=(0, 52.5, 0), x_dir=(0, 0, 1), z_dir=(0, -1, 0))), mode=Mode.SUBTRACT)

    # Sketch57 → Cut-Extrude22 (cut)
    with BuildSketch(Plane.XY.offset(15)):
        with Locations((1.375, 52.5)):
            Rectangle(SKETCH57_W, SKETCH57_H)
    extrude(amount=-CUT_EXTRUDE22_DEPTH, mode=Mode.SUBTRACT)

    # Sketch60 → Cut-Extrude24 (cut)
    with BuildSketch(Plane.XZ):
        with Locations((111.5, 14.5)):
            Rectangle(SKETCH60_W, SKETCH60_H)
    extrude(amount=-CUT_EXTRUDE24_DEPTH, mode=Mode.SUBTRACT)

    # Sketch62 → Boss-Extrude19 (add)
    with BuildSketch(Plane(origin=(0, 0, 0), x_dir=(-1, 0, 0), z_dir=(0, 0, -1))):
        with Locations((-127.05, 61.2)):
            Rectangle(SKETCH62_W, SKETCH62_H)
    extrude(amount=-BOSS_EXTRUDE19_DEPTH)

    # Sketch64 → Cut-Extrude25 (cut)
    with BuildSketch(Plane(origin=(0, 0, 0), x_dir=(-1, 0, 0), z_dir=(0, 0, -1))):
        with Locations((-127.05, 61.2)):
            Circle(SKETCH64_R)
    extrude(amount=-CUT_EXTRUDE25_DEPTH, mode=Mode.SUBTRACT)

    # Sketch63 → Cut-Extrude26 (cut)
    with BuildSketch(Plane.XY.offset(13)):
        with Locations((127.05, 61.2)):
            Circle(SKETCH63_R)
    extrude(amount=-CUT_EXTRUDE26_DEPTH, mode=Mode.SUBTRACT)

    # Fillet1
    # the kernel refuses this fillet: 2 mm, written as the material it takes off along each edge
    with BuildSketch(Plane(origin=(2, 2, 2), x_dir=(0, 0, -1), z_dir=(0, -1, 0))) as fillet1_piece_1_section:
        Polygon((0, 0), (FILLET1_R, 0), (FILLET1_R, -FILLET1_R), (0, -FILLET1_R), align=None)
    fillet1_piece_1 = extrude(amount=FILLET1_R, mode=Mode.PRIVATE)
    fillet1_piece_1 = fillet1_piece_1 - Plane(origin=(2, 2, 2), x_dir=(0.7071067811865475, 0, 0.7071067811865475), z_dir=(0, -1, 0)) * Sphere(FILLET1_R, mode=Mode.PRIVATE)
    add(fillet1_piece_1, mode=Mode.SUBTRACT)
    with BuildSketch(Plane(origin=(2, 103, 2), x_dir=(-1, 0, 0), z_dir=(0, 0, -1))) as fillet1_piece_2_section:
        Polygon((0, 0), (FILLET1_R, 0), (FILLET1_R, FILLET1_R), (0, FILLET1_R), align=None)
    fillet1_piece_2 = extrude(amount=FILLET1_R, mode=Mode.PRIVATE)
    fillet1_piece_2 = fillet1_piece_2 - Plane(origin=(2, 103, 2), x_dir=(0.7071067811865475, -0.7071067811865475, 0), z_dir=(0, 0, -1)) * Sphere(FILLET1_R, mode=Mode.PRIVATE)
    add(fillet1_piece_2, mode=Mode.SUBTRACT)
    with BuildSketch(Plane(origin=(154, 103, 2), x_dir=(0, 1, 0), z_dir=(0, 0, -1))) as fillet1_piece_3_section:
        Polygon((0, 0), (FILLET1_R, 0), (FILLET1_R, FILLET1_R), (0, FILLET1_R), align=None)
    fillet1_piece_3 = extrude(amount=FILLET1_R, mode=Mode.PRIVATE)
    fillet1_piece_3 = fillet1_piece_3 - Plane(origin=(154, 103, 2), x_dir=(-0.7071067811865475, -0.7071067811865475, 0), z_dir=(0, 0, -1)) * Sphere(FILLET1_R, mode=Mode.PRIVATE)
    add(fillet1_piece_3, mode=Mode.SUBTRACT)
    with BuildSketch(Plane(origin=(0, 0, 2), x_dir=(1, 0, 0), z_dir=(0, 0, 1)), Plane(origin=(0, 105, 2), x_dir=(0, -1, 0), z_dir=(0, 0, 1))) as fillet1_piece_4:
        with BuildLine():
            CenterArc((FILLET1_R, FILLET1_R), FILLET1_R, 180, 90)
            Line((0, FILLET1_R), (0, 0))
            Line((0, 0), (FILLET1_R, 0))
        make_face()
    extrude(amount=18, mode=Mode.SUBTRACT)
    with BuildSketch(Plane(origin=(156, 0, -5), x_dir=(-1, 0, 0), z_dir=(0, 0, 1))) as fillet1_piece_5:
        with BuildLine():
            CenterArc((FILLET1_R, -FILLET1_R), FILLET1_R, 90, 90)
            Line((0, -FILLET1_R), (0, 0))
            Line((0, 0), (FILLET1_R, 0))
        make_face()
    extrude(amount=25, mode=Mode.SUBTRACT)
    with BuildSketch(Plane(origin=(0, 103, 0), x_dir=(1, 0, 0), z_dir=(0, -1, 0))) as fillet1_piece_6:
        with BuildLine():
            CenterArc((FILLET1_R, FILLET1_R), FILLET1_R, 180, 90)
            Line((0, FILLET1_R), (0, 0))
            Line((0, 0), (FILLET1_R, 0))
        make_face()
    extrude(amount=101, mode=Mode.SUBTRACT)
    with BuildSketch(Plane(origin=(2, 0, 0), x_dir=(0, 0, 1), z_dir=(1, 0, 0))) as fillet1_piece_7:
        with BuildLine():
            CenterArc((FILLET1_R, -FILLET1_R), FILLET1_R, 90, 90)
            Line((0, -FILLET1_R), (0, 0))
            Line((0, 0), (FILLET1_R, 0))
        make_face()
    extrude(amount=130.3, mode=Mode.SUBTRACT)
    with BuildSketch(Plane(origin=(156, -5, 0), x_dir=(-1, 0, 0), z_dir=(0, 1, 0))) as fillet1_piece_8:
        with BuildLine():
            CenterArc((FILLET1_R, FILLET1_R), FILLET1_R, 180, 90)
            Line((0, FILLET1_R), (0, 0))
            Line((0, 0), (FILLET1_R, 0))
        make_face()
    extrude(amount=108, mode=Mode.SUBTRACT)
    with BuildSketch(Plane(origin=(156, 105, 2), x_dir=(0, -1, 0), z_dir=(0, 0, 1))) as fillet1_piece_9:
        with BuildLine():
            CenterArc((FILLET1_R, -FILLET1_R), FILLET1_R, 90, 90)
            Line((0, -FILLET1_R), (0, 0))
            Line((0, 0), (FILLET1_R, 0))
        make_face()
    extrude(amount=18, mode=Mode.SUBTRACT)
    with BuildSketch(Plane(origin=(154, 105, 0), x_dir=(0, -1, 0), z_dir=(-1, 0, 0))) as fillet1_piece_10:
        with BuildLine():
            CenterArc((FILLET1_R, FILLET1_R), FILLET1_R, 180, 90)
            Line((0, FILLET1_R), (0, 0))
            Line((0, 0), (FILLET1_R, 0))
        make_face()
    extrude(amount=152, mode=Mode.SUBTRACT)

    # Sketch66 → Boss-Extrude20 (add)
    with BuildSketch(Plane.XY.offset(2)):
        with Locations((80.323462853, 100)):
            Rectangle(SKETCH66_W, SKETCH66_H)
    boss_extrude20 = extrude(amount=BOSS_EXTRUDE20_DEPTH)

    # Mirror6: Boss-Extrude20 across plane
    add(boss_extrude20.mirror(Plane(origin=(0, 52.5, 0), x_dir=(0, 0, 1), z_dir=(0, -1, 0))))

    # Sketch69 walls → Rib1 (add, up to next)
    with BuildSketch(Plane.XY.offset(13), mode=Mode.PRIVATE) as rib1_sk1:
        with Locations((18.3, 101.125)):
            Rectangle(SKETCH69_WALLS_W, SKETCH69_WALLS_H)
    rib1_tool1 = extrude(rib1_sk1.sketch, amount=-RIB1_REACH, mode=Mode.PRIVATE) - part.part
    add(rib1_tool1.solids().sort_by_distance((18.3, 101.125, 13))[0])

    # Sketch70 walls → Rib2 (add, up to next)
    with BuildSketch(Plane.XY.offset(13), mode=Mode.PRIVATE) as rib2_sk1:
        with Locations((18.3, 3.875)):
            Rectangle(SKETCH70_WALLS_W, SKETCH70_WALLS_H)
    rib2_tool1 = extrude(rib2_sk1.sketch, amount=-RIB2_REACH, mode=Mode.PRIVATE) - part.part
    add(rib2_tool1.solids().sort_by_distance((18.3, 3.875, 13))[0])


solid = part.part
